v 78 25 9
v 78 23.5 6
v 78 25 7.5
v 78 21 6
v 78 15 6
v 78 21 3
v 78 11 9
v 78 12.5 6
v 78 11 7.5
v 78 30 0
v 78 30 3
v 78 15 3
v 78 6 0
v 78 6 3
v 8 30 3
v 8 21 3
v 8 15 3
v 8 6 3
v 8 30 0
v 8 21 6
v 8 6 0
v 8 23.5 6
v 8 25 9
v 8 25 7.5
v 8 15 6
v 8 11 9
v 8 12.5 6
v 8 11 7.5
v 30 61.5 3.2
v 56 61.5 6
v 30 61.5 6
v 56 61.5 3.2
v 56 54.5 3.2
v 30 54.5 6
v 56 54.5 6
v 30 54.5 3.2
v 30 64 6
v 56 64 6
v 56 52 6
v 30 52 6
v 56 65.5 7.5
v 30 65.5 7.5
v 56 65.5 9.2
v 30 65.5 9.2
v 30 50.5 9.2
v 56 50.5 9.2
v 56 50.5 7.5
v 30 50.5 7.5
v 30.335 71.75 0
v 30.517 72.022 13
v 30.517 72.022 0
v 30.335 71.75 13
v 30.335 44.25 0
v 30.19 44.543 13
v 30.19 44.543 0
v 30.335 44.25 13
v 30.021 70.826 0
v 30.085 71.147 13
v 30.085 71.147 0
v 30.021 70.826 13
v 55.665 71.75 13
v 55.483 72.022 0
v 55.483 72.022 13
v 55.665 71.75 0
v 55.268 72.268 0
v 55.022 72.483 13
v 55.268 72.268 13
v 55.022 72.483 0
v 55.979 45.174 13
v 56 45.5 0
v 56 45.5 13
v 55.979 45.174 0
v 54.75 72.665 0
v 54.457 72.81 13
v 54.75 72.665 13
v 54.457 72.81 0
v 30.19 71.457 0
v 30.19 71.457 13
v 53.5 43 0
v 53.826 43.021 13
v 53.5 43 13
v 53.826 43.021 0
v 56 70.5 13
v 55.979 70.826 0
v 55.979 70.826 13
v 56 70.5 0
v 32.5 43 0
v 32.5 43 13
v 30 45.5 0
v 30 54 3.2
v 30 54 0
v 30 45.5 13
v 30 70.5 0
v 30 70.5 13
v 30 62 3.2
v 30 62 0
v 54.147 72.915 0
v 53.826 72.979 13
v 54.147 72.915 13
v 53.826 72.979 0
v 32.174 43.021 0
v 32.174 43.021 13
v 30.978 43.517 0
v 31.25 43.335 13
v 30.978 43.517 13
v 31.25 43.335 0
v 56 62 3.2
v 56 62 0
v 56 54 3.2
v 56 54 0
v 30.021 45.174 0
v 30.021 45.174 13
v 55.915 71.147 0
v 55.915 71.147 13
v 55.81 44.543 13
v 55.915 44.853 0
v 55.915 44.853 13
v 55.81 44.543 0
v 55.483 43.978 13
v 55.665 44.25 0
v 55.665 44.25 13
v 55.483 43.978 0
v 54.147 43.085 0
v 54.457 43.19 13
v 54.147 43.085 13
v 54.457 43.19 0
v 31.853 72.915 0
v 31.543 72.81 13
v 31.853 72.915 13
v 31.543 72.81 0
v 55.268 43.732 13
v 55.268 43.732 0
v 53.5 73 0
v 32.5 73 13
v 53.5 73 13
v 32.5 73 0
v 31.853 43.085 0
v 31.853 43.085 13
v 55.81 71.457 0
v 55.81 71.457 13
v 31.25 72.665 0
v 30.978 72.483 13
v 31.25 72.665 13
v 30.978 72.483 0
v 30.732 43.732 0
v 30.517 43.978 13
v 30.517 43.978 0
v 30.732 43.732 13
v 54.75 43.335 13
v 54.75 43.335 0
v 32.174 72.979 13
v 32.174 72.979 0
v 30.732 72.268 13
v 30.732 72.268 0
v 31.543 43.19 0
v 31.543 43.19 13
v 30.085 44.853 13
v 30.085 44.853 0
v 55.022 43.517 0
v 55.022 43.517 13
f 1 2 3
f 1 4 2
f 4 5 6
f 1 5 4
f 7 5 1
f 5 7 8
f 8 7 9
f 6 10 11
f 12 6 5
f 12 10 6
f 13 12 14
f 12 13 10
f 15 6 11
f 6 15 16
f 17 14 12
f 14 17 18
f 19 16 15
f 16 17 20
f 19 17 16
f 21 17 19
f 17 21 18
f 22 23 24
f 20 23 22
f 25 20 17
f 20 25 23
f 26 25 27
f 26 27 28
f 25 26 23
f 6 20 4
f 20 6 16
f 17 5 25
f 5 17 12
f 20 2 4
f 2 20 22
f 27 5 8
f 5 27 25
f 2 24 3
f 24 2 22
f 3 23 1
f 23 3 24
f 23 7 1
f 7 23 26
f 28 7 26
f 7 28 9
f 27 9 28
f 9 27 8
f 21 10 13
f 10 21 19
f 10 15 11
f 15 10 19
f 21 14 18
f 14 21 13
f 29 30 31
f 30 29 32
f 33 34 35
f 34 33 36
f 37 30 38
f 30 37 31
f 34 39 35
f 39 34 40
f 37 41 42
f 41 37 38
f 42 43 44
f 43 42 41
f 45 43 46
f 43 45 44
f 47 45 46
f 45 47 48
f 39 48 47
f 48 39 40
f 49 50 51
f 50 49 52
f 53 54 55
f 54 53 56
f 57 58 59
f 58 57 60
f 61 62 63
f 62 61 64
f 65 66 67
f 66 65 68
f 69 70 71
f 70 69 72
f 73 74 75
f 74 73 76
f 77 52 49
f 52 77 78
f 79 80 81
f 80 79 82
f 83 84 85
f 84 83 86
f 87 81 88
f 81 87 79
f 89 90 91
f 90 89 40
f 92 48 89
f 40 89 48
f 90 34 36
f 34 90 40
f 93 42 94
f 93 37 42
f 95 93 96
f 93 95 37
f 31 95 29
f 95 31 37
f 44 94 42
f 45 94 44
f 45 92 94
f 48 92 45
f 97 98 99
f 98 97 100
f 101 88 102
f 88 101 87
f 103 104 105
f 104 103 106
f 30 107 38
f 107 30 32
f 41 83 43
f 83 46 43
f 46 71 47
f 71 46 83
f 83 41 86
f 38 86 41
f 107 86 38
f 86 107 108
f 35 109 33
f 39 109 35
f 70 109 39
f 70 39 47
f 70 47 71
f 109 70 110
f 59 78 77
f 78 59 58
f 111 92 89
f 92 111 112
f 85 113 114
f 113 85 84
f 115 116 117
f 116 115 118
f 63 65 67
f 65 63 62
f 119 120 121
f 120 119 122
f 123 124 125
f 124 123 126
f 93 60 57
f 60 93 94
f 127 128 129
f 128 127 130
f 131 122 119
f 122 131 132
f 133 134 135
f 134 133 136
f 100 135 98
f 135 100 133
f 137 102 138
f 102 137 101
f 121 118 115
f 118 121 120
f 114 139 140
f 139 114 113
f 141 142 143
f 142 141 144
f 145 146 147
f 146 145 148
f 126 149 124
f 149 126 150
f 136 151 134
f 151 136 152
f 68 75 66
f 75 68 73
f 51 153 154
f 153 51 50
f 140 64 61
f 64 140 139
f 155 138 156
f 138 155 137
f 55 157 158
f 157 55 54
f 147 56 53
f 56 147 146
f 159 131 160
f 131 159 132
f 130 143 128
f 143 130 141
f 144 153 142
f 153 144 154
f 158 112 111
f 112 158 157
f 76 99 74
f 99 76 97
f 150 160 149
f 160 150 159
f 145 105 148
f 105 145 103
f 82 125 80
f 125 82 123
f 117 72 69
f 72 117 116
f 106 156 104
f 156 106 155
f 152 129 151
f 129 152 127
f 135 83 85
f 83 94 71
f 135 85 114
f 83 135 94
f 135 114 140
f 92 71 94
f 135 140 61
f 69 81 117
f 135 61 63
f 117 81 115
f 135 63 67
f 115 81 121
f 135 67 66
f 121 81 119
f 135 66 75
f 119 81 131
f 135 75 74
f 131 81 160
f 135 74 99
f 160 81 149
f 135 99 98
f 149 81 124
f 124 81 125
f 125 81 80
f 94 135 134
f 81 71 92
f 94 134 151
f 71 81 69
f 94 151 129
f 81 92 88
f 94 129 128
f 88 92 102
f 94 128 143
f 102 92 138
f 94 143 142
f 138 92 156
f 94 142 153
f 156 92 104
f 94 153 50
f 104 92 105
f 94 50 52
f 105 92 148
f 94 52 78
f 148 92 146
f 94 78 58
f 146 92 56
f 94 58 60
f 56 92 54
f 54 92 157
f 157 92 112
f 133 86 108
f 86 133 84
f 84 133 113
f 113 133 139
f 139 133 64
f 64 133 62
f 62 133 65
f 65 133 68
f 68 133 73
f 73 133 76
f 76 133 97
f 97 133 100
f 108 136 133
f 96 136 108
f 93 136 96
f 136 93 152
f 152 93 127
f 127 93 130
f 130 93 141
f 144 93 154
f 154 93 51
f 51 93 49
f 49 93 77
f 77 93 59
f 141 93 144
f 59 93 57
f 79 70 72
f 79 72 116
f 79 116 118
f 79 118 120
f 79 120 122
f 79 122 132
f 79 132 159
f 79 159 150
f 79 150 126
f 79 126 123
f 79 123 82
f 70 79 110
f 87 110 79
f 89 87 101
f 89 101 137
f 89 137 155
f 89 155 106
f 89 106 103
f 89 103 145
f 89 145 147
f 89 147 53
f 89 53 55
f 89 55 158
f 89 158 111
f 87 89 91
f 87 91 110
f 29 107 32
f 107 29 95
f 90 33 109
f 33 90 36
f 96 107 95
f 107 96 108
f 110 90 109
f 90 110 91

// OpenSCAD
/*
Sample 092: Pilzkopf-/T-Linearführung — 0,50 mm
Generated from the FDM Mechanical Sample Library.
Units: millimetres.

Override examples:
  openscad -o custom.stl -D 'view="plate"' -D 'render_fn=64' model.scad
  openscad -o preview.png -D 'view="assembly"' model.scad
*/
use <../../../library/fdm_mechanisms.scad>

render_fn = is_undef(render_fn) ? 48 : render_fn;
view = is_undef(view) ? "plate" : view;
$fn = render_fn;

sample_t_rail(
    view=view,
    clearance=0.5,
    length=70,
    carriage_l=26
);
